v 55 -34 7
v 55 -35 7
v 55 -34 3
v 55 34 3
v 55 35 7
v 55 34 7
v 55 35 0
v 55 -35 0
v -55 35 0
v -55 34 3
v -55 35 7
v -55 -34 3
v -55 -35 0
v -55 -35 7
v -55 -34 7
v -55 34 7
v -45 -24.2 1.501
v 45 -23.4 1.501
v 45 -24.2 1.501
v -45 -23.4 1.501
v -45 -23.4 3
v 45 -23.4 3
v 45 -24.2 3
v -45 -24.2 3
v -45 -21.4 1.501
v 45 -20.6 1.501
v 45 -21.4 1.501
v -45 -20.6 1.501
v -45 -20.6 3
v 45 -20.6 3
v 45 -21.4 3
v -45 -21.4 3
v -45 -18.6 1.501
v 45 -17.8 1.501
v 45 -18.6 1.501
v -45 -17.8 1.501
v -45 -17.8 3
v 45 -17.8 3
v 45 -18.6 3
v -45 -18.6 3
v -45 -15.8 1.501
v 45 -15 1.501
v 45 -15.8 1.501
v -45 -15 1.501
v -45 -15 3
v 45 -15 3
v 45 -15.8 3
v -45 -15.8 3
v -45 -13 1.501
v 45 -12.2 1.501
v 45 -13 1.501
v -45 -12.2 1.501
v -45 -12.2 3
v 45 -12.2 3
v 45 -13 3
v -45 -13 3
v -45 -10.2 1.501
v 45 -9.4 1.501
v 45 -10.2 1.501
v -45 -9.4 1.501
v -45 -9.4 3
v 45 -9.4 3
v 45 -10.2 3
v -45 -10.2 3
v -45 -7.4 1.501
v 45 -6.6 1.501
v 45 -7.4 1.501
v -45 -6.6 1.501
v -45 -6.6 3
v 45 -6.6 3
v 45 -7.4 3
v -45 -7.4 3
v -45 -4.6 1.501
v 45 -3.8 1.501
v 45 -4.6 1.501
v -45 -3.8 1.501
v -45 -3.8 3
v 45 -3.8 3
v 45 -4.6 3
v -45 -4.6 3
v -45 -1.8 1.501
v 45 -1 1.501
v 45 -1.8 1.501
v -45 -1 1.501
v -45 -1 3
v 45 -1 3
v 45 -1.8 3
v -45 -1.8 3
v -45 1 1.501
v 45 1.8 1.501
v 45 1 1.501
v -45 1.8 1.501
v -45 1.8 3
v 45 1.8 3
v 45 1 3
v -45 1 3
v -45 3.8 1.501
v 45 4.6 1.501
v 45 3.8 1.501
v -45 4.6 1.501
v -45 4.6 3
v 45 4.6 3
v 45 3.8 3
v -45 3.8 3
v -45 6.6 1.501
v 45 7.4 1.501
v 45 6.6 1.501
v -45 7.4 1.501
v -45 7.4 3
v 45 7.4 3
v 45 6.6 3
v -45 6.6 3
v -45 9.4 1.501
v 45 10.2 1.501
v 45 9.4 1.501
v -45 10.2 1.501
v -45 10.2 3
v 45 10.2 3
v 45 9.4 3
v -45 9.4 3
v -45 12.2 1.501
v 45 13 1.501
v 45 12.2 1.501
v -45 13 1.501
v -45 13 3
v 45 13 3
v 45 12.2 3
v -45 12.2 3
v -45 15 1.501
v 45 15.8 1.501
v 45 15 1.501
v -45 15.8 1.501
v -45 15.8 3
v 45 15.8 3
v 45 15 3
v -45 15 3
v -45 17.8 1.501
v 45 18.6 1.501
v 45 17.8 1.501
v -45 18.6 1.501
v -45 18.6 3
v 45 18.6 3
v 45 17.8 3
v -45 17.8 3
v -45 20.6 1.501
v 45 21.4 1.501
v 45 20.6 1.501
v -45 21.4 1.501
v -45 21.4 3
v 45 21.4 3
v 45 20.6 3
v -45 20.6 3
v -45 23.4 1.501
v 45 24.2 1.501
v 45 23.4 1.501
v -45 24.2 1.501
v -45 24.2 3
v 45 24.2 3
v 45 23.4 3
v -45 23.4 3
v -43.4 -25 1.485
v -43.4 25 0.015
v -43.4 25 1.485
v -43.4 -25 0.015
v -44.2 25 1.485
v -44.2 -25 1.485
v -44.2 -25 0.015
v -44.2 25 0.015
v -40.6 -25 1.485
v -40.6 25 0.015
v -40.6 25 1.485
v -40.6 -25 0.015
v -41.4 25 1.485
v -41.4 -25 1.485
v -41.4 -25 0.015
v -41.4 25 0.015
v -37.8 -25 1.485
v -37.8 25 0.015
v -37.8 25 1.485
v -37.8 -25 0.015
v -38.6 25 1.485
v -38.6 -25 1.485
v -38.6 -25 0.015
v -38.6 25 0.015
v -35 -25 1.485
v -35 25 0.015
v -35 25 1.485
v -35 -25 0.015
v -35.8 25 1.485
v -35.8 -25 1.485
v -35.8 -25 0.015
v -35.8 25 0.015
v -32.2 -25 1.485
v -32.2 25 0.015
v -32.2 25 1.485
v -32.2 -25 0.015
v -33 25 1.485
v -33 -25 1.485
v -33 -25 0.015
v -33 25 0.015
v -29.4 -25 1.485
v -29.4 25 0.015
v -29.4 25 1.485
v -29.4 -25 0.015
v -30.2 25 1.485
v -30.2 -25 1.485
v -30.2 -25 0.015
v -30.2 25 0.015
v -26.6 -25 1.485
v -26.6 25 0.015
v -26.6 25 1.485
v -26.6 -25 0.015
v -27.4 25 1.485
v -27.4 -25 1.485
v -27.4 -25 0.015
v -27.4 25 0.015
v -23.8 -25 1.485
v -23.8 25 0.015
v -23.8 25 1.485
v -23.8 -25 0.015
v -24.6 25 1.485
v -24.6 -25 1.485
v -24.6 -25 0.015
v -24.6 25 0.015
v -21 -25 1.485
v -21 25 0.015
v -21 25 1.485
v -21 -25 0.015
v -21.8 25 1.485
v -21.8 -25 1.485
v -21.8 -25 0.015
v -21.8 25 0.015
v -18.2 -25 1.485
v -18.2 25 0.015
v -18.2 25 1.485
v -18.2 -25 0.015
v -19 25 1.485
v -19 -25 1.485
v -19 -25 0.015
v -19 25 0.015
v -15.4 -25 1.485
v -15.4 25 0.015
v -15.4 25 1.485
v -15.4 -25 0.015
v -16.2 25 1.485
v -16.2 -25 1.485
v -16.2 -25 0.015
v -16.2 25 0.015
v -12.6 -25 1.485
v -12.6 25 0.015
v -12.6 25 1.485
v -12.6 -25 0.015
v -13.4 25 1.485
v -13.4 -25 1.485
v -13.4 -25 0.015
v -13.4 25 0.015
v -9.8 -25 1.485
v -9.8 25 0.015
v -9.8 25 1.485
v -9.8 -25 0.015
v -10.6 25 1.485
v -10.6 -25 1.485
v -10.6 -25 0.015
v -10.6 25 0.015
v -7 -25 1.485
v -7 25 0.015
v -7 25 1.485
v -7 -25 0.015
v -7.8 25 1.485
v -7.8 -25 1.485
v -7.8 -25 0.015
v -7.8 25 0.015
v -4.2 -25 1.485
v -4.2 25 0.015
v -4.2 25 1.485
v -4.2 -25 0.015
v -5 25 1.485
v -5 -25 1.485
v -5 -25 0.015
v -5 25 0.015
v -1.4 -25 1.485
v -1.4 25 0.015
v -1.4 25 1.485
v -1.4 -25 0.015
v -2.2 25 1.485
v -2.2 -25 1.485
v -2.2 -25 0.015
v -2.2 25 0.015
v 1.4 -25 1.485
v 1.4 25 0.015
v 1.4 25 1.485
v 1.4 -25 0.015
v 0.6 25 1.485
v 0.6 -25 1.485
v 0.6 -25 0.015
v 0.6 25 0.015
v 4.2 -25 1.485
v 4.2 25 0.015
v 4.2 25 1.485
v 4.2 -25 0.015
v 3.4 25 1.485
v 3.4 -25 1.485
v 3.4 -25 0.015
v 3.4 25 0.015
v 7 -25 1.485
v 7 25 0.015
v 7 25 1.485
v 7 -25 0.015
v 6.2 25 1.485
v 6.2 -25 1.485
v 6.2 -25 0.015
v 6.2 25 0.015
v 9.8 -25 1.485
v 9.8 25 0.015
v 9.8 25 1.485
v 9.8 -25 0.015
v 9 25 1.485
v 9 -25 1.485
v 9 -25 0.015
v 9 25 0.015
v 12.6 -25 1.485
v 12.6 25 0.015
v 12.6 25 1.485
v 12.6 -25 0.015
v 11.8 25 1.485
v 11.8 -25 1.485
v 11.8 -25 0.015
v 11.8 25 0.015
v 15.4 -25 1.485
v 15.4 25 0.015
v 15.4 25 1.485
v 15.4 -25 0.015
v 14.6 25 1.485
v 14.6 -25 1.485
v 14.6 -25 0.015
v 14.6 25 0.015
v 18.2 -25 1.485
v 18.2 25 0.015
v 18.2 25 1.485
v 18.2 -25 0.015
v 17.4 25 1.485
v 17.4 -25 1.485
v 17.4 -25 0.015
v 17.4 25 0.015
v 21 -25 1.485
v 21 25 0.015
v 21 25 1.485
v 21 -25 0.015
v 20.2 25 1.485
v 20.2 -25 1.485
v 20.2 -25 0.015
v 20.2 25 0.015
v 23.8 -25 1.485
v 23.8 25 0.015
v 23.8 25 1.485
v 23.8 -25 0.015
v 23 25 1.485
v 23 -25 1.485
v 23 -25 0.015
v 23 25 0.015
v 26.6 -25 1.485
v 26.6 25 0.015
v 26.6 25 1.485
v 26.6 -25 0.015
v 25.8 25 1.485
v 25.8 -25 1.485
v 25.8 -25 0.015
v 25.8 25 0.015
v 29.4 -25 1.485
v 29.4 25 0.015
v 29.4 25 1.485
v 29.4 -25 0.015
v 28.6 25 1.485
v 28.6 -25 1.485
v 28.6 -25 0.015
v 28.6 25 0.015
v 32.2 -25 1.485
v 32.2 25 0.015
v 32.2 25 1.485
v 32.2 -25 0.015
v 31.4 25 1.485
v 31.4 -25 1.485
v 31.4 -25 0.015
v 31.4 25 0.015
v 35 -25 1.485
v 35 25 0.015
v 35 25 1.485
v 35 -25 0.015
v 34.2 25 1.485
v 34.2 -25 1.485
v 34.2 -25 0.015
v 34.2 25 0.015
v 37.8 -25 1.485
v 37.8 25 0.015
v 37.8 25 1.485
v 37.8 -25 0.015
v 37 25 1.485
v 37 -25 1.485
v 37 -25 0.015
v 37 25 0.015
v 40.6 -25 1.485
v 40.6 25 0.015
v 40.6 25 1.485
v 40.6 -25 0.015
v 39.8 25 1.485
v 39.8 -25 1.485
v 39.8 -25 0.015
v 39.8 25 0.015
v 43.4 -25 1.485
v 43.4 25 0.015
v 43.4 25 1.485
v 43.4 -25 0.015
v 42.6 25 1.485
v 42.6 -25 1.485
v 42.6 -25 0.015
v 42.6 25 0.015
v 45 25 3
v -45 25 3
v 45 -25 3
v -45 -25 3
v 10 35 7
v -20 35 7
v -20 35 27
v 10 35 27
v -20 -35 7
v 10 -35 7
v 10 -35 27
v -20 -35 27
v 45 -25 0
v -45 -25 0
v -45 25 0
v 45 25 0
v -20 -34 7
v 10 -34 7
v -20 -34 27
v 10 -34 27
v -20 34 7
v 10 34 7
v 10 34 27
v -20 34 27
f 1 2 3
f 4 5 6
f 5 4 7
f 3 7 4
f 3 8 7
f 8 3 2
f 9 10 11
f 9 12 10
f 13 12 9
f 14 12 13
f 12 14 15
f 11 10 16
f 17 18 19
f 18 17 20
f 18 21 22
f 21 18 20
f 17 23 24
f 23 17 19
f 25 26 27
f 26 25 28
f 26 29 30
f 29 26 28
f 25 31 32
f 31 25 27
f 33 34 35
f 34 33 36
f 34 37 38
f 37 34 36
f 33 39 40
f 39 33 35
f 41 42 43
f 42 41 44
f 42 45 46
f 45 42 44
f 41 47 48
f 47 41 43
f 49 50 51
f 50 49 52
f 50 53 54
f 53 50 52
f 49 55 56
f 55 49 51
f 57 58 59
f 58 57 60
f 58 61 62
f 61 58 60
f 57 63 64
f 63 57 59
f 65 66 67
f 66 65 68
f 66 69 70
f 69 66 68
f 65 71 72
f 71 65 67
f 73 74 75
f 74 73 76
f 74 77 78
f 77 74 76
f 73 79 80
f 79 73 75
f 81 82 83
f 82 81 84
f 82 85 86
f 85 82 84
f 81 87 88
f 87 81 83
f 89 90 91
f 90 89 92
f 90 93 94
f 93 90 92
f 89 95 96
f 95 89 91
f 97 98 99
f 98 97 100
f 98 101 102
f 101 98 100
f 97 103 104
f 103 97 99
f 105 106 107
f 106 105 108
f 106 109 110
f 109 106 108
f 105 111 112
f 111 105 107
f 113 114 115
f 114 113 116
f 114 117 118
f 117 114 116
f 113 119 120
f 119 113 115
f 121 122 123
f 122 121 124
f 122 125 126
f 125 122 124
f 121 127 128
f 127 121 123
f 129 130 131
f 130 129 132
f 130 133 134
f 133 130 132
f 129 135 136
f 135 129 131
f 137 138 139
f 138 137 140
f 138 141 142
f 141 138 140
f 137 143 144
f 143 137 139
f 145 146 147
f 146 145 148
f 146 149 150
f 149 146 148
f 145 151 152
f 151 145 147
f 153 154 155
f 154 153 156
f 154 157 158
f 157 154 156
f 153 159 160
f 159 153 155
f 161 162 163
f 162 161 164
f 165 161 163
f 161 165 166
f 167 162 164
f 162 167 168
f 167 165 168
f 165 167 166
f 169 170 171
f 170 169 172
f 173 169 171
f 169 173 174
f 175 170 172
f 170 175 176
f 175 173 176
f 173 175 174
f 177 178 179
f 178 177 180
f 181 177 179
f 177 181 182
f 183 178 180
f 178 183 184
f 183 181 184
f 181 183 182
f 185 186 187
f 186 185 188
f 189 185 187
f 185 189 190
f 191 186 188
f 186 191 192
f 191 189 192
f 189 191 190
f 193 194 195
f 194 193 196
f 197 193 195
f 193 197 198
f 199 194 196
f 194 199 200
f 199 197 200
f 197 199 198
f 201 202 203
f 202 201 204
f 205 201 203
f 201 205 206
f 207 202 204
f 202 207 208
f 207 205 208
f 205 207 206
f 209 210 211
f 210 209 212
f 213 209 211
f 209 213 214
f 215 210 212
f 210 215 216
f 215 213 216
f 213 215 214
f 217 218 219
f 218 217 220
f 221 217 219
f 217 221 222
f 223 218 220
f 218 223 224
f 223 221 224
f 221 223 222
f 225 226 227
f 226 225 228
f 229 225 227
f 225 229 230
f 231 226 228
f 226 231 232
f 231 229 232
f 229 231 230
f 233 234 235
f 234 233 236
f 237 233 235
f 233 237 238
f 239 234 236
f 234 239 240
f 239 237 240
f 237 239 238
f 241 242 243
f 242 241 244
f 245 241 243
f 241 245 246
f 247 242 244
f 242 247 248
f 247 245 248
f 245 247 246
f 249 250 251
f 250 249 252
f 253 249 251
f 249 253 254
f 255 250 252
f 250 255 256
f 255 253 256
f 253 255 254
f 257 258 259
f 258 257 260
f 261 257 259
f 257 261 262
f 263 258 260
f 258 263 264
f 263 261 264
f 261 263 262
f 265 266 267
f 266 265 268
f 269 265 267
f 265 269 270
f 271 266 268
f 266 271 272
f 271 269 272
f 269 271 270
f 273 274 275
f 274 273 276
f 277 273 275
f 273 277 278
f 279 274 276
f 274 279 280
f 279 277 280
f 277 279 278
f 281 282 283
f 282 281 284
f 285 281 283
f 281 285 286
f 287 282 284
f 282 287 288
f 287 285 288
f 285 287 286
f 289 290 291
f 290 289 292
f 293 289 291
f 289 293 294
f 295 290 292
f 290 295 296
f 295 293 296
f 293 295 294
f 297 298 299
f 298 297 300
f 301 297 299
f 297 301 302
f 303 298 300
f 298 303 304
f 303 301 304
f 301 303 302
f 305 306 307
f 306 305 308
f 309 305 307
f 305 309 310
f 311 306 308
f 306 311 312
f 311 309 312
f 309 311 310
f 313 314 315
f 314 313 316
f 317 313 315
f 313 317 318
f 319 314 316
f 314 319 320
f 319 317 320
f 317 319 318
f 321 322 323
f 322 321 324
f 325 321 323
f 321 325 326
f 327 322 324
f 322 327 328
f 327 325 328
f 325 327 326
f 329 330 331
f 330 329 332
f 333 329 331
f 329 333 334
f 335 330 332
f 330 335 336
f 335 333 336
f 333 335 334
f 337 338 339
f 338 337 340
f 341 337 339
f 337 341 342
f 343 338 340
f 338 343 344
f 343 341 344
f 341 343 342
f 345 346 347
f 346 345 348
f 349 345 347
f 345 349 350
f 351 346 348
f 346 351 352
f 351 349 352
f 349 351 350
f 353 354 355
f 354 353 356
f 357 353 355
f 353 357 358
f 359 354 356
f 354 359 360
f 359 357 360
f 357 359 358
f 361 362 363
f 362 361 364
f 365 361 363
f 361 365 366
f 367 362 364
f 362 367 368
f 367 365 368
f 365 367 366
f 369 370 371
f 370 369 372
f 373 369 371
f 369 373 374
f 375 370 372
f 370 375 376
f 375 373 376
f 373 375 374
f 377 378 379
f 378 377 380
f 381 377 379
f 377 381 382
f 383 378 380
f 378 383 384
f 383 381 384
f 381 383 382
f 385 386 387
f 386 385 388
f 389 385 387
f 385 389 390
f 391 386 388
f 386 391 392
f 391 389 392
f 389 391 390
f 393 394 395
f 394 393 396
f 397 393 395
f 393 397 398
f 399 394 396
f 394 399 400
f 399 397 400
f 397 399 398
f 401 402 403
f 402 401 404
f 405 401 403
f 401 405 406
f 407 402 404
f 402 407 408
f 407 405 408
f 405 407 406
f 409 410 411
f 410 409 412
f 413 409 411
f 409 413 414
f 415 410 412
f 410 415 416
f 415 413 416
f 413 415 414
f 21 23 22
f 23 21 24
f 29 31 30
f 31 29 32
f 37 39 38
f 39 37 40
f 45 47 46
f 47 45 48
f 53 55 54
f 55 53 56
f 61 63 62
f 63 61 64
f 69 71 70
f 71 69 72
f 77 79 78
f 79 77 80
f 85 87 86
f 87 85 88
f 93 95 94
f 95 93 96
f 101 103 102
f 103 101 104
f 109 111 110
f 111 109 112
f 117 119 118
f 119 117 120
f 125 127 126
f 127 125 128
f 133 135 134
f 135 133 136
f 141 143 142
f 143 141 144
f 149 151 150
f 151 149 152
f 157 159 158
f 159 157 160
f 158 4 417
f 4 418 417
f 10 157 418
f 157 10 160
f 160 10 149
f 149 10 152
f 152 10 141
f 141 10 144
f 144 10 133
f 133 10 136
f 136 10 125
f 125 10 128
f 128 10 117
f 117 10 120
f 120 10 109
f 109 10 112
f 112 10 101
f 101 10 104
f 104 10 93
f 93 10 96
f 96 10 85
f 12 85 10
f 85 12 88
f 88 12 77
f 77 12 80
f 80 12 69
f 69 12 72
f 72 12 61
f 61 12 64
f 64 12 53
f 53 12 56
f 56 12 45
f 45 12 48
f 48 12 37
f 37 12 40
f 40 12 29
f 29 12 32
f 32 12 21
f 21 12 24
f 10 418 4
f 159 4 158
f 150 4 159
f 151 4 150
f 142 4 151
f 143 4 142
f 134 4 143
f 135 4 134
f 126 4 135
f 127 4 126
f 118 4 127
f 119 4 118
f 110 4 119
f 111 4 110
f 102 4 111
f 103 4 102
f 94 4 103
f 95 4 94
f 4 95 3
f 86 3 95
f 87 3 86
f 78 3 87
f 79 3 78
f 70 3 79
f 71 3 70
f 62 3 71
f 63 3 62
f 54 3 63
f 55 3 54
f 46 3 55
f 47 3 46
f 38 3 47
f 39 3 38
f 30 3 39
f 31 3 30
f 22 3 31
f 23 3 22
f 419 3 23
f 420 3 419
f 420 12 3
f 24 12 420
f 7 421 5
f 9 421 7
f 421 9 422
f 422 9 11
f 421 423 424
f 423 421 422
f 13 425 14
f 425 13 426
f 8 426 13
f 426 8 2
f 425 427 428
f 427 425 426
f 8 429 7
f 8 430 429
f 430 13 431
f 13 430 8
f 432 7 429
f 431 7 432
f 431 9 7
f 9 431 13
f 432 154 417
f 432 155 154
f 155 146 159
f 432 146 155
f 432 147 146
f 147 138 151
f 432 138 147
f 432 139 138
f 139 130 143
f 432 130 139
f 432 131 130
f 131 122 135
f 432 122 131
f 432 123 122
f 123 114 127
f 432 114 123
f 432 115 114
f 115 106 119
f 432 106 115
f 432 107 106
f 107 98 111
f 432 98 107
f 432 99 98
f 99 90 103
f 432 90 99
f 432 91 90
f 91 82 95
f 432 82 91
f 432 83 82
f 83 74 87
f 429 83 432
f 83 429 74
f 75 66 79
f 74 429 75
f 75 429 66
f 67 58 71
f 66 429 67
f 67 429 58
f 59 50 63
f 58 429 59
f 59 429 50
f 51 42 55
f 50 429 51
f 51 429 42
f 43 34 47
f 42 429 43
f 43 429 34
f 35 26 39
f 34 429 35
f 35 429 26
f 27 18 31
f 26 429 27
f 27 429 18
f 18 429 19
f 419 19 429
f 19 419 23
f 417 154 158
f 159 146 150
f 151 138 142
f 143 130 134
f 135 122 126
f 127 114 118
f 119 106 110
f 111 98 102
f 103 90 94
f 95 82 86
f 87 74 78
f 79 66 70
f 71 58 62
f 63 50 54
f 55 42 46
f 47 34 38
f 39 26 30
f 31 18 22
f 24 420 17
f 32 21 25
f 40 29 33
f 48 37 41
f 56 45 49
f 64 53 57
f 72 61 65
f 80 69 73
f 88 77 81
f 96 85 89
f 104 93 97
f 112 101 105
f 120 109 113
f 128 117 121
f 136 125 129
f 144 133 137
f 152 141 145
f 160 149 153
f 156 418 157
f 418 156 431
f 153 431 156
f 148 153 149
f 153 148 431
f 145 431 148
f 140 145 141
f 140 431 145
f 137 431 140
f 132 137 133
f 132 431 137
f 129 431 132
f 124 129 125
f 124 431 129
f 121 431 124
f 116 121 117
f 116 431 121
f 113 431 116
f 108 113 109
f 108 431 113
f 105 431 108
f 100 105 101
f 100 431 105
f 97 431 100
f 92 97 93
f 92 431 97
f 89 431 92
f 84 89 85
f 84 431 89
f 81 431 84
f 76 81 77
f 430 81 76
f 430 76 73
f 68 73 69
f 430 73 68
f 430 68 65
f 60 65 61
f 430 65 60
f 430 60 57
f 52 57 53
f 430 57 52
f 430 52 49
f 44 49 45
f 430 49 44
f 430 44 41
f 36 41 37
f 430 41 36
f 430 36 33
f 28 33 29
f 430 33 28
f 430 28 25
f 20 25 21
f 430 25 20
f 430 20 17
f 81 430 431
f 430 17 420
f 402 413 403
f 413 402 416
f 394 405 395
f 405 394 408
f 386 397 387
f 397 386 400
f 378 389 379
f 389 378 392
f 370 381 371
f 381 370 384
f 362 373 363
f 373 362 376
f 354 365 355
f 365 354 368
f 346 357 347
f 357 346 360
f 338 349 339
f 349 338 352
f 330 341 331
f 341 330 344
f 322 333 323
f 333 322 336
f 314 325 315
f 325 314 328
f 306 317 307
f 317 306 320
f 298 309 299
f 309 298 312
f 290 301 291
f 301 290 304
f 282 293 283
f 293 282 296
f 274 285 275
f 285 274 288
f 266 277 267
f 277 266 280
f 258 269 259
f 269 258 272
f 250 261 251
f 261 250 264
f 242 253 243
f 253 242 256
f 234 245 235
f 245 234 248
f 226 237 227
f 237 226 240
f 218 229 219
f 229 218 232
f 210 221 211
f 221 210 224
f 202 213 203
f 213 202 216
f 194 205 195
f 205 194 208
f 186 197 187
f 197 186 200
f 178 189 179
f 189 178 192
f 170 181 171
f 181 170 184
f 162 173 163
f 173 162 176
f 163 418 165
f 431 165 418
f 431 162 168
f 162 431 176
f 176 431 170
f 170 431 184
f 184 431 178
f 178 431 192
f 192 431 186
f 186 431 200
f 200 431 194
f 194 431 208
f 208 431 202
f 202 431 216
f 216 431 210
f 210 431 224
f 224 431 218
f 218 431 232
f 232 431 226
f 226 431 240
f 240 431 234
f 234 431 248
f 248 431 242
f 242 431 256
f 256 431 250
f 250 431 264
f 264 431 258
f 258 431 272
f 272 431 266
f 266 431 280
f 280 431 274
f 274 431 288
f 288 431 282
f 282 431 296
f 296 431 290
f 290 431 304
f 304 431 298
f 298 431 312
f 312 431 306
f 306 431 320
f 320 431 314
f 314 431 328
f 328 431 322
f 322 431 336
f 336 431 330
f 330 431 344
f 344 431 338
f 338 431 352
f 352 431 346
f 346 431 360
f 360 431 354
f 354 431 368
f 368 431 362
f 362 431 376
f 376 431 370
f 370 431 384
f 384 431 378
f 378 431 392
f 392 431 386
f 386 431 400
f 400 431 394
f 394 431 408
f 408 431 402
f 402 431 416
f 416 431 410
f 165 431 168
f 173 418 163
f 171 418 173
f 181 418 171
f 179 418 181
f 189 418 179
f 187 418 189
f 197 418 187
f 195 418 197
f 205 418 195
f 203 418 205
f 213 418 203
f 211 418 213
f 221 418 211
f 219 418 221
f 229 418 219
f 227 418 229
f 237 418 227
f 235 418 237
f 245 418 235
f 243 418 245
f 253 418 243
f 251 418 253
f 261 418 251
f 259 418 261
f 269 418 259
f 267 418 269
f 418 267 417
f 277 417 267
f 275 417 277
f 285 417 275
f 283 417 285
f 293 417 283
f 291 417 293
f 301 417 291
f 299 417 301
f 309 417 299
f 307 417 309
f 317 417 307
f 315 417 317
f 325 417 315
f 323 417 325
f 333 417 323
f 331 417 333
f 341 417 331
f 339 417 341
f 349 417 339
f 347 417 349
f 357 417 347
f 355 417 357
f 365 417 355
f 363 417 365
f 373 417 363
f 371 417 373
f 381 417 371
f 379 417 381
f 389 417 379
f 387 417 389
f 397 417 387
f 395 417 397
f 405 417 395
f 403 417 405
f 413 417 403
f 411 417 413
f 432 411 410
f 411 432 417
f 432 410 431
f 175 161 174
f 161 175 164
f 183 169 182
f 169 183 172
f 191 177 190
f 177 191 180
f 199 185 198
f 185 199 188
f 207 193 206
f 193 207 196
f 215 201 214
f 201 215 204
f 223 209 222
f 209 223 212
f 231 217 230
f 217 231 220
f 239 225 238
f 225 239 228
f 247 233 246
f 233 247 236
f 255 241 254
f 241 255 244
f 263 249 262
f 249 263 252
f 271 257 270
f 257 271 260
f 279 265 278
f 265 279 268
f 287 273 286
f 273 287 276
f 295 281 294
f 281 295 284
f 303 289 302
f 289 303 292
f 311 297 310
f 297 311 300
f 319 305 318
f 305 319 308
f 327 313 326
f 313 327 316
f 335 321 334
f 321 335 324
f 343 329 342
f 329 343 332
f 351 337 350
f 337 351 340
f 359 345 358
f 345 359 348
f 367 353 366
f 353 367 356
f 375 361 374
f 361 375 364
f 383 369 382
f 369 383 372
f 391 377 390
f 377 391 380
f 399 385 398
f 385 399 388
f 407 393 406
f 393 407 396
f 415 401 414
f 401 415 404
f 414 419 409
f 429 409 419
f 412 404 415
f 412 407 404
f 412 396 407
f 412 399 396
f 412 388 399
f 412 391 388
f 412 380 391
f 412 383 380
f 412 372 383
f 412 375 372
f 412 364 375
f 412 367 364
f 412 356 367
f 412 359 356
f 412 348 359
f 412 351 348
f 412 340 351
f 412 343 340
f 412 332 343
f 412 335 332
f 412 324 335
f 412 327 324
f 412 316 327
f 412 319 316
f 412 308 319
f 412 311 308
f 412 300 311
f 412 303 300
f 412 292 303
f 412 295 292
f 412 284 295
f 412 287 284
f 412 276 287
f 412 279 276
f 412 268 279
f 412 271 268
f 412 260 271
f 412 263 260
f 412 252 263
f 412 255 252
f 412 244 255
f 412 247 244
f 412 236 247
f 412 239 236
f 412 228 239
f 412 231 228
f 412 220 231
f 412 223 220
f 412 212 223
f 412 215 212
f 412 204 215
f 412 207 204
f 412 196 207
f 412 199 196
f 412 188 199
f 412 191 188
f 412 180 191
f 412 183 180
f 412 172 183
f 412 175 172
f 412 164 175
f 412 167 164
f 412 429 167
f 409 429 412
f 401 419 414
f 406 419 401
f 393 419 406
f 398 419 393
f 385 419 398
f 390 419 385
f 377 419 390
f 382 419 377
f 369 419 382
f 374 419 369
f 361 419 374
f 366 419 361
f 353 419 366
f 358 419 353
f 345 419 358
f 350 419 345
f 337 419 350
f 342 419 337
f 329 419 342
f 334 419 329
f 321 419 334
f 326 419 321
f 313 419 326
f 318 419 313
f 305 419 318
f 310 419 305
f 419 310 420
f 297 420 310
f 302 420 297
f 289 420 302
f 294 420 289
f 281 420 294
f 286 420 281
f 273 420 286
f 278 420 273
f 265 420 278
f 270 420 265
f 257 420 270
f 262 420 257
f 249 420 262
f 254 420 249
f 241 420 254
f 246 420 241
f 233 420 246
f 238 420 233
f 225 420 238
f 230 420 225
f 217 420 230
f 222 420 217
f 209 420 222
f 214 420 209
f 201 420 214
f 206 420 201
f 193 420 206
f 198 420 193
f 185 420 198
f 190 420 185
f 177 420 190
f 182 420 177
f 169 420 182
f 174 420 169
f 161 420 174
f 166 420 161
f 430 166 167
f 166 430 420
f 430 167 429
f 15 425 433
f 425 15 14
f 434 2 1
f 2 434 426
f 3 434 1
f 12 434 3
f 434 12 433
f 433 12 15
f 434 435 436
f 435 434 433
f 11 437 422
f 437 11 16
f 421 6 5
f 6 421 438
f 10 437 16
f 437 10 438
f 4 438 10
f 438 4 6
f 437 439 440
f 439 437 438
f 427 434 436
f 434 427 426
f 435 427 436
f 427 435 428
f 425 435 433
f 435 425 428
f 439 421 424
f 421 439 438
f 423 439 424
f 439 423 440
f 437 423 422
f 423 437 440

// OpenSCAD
// Fine mesh screen (Now with rectangles!!)
// by churusaa 2020 (https://www.thingiverse.com/churusaa)
// Licensed under Creative Commons - GNU GPL License
// More detail at:
// http://www.thingiverse.com/thing:4396258

// Remixed from Wauter's Fine mesh screen object
// https://www.thingiverse.com/thing:27805 
// When printing a very fine mesh pattern, the slicer will slice the mesh into little
// squares instead of long threads. This mesh screen fixes that by separating the perpendicular threads 
// with a tiny gap. your slicer will close the gap when slicing, but will recognize the
// threads as lines and not as little squares.

  //////////////////////////
 // Customizer Settings: //
//////////////////////////

//Generate a circle, a square, or a rectangle:
generateShape = "rectangle"; // [circle,square,rectangle]

//Diameter of the circle, or side of the square:
meshscreen_d = 70;

//Length of the rectangle (used by meshscreen_rectangle):
meshscreen_l = 110;

//Width of the solid border around the mesh:
meshscreen_borderwidth = 10;

//Thickness of the screen. should be a multiple of you layer height for best results:
meshscreen_h = 3; 

//Print layer height:
layer_h = 1;

//Meshthread width. Please keep this a multiple of the width of the thread of //your printer. Use multiple shells in your slicing settings if necessary:
meshthread_w = 0.8;

//Spacing in between mesh threads:
mesh_space = 2;

module GoAwayCustomizer() {
// This module is here to stop Customizer from picking up the variables below
}

generateSquare = "square";
generateCircle = "circle";
generateRectangle = "rectangle";


module mesh_raw(h=2,mesh_w=1,mesh_l=1,mesh_space=2,width=50,length=50,layer_h=0.3){
	for ( j = [0 :(mesh_w+mesh_space): width] )
	{
		translate([0,0,h/2+0.001])translate([0, -width/2+j, h/4])cube([length,mesh_w,h/2],center=true);
	}
    for ( j = [0 :(mesh_w+mesh_space): length] )
    {
        translate([0,0,0])translate([-length/2+j, 0, h/4])cube([mesh_w,length,h/2-layer_h/10],center=true);
    }

}

module meshscreen_circle(h=2,border_w=meshscreen_borderwidth,mesh_w=1,mesh_space=2,width=60,length=60,layer_h=0.3){
	intersection(){
		cylinder(r=width/2,h);
		mesh_raw(h=h,mesh_w=mesh_w,mesh_space=mesh_space,width=width,length=length,layer_h=0.3);
	}
	difference(){
		cylinder(r=width/2,h);
		translate([0,0,-h*0.05])cylinder(r=width/2-border_w,h=h*1.1);
	}
}

module meshscreen_square(h=2,border_w=meshscreen_borderwidth,mesh_w=1,mesh_space=2,width=60,length=60,layer_h=0.3){
	intersection(){
		translate([0,0,h/2])cube([width,width,h],center=true);
		mesh_raw(h=h,mesh_w=mesh_w,mesh_space=mesh_space,width=width,length=length,layer_h=0.3);
	}
	difference(){
		translate([0,0,h/2])cube([width,width,h],center=true);	translate([0,0,h/2])cube([width-border_w*2,width-border_w*2,h*1.1],center=true);
	}
}

module meshscreen_rectangle(h=2,border_w=meshscreen_borderwidth,mesh_w=1,mesh_space=2,width=60,length=60,layer_h=0.3){
	intersection(){
		translate([0,0,h/2])cube([length,width,h],center=true);
		mesh_raw(h=h,mesh_w=mesh_w,mesh_space=mesh_space,width=width,length=length,layer_h=0.3);
	}
	difference(){
		translate([0,0,h/2])cube([length,width,h],center=true);	translate([0,0,h/2])cube([length-border_w*2,width-border_w*2,h*1.1],center=true);
	}
}

if (generateShape == generateCircle) {
	meshscreen_circle(h=meshscreen_h,border_w=meshscreen_borderwidth,mesh_w=meshthread_w,mesh_space=mesh_space,width=meshscreen_d,length=meshscreen_d,layer_h=layer_h);
}
else if (generateShape == generateRectangle) {
	meshscreen_rectangle(h=meshscreen_h,border_w=meshscreen_borderwidth,mesh_w=meshthread_w,mesh_space=mesh_space,width=meshscreen_d,length=meshscreen_l,layer_h=layer_h);
}
else if (generateShape == generateSquare) {
	meshscreen_square(h=meshscreen_h,border_w=meshscreen_borderwidth,mesh_w=meshthread_w,mesh_space=mesh_space,width=meshscreen_d,length=meshscreen_d,layer_h=layer_h);
}
else {
	sphere(10);
    translate([15, 15, 15]) {
        text("Something went very oops.", font = "Liberation Sans");
    }
}

translate([-55,-35,2]) {
    cube([110,1,5]);
}

translate([-55,34,2]) {
    cube([110,1,5]);
}

translate([-20,-35,2]) {
    cube([30,1,25]);
}

translate([-20,34,2]) {
    cube([30,1,25]);
}
